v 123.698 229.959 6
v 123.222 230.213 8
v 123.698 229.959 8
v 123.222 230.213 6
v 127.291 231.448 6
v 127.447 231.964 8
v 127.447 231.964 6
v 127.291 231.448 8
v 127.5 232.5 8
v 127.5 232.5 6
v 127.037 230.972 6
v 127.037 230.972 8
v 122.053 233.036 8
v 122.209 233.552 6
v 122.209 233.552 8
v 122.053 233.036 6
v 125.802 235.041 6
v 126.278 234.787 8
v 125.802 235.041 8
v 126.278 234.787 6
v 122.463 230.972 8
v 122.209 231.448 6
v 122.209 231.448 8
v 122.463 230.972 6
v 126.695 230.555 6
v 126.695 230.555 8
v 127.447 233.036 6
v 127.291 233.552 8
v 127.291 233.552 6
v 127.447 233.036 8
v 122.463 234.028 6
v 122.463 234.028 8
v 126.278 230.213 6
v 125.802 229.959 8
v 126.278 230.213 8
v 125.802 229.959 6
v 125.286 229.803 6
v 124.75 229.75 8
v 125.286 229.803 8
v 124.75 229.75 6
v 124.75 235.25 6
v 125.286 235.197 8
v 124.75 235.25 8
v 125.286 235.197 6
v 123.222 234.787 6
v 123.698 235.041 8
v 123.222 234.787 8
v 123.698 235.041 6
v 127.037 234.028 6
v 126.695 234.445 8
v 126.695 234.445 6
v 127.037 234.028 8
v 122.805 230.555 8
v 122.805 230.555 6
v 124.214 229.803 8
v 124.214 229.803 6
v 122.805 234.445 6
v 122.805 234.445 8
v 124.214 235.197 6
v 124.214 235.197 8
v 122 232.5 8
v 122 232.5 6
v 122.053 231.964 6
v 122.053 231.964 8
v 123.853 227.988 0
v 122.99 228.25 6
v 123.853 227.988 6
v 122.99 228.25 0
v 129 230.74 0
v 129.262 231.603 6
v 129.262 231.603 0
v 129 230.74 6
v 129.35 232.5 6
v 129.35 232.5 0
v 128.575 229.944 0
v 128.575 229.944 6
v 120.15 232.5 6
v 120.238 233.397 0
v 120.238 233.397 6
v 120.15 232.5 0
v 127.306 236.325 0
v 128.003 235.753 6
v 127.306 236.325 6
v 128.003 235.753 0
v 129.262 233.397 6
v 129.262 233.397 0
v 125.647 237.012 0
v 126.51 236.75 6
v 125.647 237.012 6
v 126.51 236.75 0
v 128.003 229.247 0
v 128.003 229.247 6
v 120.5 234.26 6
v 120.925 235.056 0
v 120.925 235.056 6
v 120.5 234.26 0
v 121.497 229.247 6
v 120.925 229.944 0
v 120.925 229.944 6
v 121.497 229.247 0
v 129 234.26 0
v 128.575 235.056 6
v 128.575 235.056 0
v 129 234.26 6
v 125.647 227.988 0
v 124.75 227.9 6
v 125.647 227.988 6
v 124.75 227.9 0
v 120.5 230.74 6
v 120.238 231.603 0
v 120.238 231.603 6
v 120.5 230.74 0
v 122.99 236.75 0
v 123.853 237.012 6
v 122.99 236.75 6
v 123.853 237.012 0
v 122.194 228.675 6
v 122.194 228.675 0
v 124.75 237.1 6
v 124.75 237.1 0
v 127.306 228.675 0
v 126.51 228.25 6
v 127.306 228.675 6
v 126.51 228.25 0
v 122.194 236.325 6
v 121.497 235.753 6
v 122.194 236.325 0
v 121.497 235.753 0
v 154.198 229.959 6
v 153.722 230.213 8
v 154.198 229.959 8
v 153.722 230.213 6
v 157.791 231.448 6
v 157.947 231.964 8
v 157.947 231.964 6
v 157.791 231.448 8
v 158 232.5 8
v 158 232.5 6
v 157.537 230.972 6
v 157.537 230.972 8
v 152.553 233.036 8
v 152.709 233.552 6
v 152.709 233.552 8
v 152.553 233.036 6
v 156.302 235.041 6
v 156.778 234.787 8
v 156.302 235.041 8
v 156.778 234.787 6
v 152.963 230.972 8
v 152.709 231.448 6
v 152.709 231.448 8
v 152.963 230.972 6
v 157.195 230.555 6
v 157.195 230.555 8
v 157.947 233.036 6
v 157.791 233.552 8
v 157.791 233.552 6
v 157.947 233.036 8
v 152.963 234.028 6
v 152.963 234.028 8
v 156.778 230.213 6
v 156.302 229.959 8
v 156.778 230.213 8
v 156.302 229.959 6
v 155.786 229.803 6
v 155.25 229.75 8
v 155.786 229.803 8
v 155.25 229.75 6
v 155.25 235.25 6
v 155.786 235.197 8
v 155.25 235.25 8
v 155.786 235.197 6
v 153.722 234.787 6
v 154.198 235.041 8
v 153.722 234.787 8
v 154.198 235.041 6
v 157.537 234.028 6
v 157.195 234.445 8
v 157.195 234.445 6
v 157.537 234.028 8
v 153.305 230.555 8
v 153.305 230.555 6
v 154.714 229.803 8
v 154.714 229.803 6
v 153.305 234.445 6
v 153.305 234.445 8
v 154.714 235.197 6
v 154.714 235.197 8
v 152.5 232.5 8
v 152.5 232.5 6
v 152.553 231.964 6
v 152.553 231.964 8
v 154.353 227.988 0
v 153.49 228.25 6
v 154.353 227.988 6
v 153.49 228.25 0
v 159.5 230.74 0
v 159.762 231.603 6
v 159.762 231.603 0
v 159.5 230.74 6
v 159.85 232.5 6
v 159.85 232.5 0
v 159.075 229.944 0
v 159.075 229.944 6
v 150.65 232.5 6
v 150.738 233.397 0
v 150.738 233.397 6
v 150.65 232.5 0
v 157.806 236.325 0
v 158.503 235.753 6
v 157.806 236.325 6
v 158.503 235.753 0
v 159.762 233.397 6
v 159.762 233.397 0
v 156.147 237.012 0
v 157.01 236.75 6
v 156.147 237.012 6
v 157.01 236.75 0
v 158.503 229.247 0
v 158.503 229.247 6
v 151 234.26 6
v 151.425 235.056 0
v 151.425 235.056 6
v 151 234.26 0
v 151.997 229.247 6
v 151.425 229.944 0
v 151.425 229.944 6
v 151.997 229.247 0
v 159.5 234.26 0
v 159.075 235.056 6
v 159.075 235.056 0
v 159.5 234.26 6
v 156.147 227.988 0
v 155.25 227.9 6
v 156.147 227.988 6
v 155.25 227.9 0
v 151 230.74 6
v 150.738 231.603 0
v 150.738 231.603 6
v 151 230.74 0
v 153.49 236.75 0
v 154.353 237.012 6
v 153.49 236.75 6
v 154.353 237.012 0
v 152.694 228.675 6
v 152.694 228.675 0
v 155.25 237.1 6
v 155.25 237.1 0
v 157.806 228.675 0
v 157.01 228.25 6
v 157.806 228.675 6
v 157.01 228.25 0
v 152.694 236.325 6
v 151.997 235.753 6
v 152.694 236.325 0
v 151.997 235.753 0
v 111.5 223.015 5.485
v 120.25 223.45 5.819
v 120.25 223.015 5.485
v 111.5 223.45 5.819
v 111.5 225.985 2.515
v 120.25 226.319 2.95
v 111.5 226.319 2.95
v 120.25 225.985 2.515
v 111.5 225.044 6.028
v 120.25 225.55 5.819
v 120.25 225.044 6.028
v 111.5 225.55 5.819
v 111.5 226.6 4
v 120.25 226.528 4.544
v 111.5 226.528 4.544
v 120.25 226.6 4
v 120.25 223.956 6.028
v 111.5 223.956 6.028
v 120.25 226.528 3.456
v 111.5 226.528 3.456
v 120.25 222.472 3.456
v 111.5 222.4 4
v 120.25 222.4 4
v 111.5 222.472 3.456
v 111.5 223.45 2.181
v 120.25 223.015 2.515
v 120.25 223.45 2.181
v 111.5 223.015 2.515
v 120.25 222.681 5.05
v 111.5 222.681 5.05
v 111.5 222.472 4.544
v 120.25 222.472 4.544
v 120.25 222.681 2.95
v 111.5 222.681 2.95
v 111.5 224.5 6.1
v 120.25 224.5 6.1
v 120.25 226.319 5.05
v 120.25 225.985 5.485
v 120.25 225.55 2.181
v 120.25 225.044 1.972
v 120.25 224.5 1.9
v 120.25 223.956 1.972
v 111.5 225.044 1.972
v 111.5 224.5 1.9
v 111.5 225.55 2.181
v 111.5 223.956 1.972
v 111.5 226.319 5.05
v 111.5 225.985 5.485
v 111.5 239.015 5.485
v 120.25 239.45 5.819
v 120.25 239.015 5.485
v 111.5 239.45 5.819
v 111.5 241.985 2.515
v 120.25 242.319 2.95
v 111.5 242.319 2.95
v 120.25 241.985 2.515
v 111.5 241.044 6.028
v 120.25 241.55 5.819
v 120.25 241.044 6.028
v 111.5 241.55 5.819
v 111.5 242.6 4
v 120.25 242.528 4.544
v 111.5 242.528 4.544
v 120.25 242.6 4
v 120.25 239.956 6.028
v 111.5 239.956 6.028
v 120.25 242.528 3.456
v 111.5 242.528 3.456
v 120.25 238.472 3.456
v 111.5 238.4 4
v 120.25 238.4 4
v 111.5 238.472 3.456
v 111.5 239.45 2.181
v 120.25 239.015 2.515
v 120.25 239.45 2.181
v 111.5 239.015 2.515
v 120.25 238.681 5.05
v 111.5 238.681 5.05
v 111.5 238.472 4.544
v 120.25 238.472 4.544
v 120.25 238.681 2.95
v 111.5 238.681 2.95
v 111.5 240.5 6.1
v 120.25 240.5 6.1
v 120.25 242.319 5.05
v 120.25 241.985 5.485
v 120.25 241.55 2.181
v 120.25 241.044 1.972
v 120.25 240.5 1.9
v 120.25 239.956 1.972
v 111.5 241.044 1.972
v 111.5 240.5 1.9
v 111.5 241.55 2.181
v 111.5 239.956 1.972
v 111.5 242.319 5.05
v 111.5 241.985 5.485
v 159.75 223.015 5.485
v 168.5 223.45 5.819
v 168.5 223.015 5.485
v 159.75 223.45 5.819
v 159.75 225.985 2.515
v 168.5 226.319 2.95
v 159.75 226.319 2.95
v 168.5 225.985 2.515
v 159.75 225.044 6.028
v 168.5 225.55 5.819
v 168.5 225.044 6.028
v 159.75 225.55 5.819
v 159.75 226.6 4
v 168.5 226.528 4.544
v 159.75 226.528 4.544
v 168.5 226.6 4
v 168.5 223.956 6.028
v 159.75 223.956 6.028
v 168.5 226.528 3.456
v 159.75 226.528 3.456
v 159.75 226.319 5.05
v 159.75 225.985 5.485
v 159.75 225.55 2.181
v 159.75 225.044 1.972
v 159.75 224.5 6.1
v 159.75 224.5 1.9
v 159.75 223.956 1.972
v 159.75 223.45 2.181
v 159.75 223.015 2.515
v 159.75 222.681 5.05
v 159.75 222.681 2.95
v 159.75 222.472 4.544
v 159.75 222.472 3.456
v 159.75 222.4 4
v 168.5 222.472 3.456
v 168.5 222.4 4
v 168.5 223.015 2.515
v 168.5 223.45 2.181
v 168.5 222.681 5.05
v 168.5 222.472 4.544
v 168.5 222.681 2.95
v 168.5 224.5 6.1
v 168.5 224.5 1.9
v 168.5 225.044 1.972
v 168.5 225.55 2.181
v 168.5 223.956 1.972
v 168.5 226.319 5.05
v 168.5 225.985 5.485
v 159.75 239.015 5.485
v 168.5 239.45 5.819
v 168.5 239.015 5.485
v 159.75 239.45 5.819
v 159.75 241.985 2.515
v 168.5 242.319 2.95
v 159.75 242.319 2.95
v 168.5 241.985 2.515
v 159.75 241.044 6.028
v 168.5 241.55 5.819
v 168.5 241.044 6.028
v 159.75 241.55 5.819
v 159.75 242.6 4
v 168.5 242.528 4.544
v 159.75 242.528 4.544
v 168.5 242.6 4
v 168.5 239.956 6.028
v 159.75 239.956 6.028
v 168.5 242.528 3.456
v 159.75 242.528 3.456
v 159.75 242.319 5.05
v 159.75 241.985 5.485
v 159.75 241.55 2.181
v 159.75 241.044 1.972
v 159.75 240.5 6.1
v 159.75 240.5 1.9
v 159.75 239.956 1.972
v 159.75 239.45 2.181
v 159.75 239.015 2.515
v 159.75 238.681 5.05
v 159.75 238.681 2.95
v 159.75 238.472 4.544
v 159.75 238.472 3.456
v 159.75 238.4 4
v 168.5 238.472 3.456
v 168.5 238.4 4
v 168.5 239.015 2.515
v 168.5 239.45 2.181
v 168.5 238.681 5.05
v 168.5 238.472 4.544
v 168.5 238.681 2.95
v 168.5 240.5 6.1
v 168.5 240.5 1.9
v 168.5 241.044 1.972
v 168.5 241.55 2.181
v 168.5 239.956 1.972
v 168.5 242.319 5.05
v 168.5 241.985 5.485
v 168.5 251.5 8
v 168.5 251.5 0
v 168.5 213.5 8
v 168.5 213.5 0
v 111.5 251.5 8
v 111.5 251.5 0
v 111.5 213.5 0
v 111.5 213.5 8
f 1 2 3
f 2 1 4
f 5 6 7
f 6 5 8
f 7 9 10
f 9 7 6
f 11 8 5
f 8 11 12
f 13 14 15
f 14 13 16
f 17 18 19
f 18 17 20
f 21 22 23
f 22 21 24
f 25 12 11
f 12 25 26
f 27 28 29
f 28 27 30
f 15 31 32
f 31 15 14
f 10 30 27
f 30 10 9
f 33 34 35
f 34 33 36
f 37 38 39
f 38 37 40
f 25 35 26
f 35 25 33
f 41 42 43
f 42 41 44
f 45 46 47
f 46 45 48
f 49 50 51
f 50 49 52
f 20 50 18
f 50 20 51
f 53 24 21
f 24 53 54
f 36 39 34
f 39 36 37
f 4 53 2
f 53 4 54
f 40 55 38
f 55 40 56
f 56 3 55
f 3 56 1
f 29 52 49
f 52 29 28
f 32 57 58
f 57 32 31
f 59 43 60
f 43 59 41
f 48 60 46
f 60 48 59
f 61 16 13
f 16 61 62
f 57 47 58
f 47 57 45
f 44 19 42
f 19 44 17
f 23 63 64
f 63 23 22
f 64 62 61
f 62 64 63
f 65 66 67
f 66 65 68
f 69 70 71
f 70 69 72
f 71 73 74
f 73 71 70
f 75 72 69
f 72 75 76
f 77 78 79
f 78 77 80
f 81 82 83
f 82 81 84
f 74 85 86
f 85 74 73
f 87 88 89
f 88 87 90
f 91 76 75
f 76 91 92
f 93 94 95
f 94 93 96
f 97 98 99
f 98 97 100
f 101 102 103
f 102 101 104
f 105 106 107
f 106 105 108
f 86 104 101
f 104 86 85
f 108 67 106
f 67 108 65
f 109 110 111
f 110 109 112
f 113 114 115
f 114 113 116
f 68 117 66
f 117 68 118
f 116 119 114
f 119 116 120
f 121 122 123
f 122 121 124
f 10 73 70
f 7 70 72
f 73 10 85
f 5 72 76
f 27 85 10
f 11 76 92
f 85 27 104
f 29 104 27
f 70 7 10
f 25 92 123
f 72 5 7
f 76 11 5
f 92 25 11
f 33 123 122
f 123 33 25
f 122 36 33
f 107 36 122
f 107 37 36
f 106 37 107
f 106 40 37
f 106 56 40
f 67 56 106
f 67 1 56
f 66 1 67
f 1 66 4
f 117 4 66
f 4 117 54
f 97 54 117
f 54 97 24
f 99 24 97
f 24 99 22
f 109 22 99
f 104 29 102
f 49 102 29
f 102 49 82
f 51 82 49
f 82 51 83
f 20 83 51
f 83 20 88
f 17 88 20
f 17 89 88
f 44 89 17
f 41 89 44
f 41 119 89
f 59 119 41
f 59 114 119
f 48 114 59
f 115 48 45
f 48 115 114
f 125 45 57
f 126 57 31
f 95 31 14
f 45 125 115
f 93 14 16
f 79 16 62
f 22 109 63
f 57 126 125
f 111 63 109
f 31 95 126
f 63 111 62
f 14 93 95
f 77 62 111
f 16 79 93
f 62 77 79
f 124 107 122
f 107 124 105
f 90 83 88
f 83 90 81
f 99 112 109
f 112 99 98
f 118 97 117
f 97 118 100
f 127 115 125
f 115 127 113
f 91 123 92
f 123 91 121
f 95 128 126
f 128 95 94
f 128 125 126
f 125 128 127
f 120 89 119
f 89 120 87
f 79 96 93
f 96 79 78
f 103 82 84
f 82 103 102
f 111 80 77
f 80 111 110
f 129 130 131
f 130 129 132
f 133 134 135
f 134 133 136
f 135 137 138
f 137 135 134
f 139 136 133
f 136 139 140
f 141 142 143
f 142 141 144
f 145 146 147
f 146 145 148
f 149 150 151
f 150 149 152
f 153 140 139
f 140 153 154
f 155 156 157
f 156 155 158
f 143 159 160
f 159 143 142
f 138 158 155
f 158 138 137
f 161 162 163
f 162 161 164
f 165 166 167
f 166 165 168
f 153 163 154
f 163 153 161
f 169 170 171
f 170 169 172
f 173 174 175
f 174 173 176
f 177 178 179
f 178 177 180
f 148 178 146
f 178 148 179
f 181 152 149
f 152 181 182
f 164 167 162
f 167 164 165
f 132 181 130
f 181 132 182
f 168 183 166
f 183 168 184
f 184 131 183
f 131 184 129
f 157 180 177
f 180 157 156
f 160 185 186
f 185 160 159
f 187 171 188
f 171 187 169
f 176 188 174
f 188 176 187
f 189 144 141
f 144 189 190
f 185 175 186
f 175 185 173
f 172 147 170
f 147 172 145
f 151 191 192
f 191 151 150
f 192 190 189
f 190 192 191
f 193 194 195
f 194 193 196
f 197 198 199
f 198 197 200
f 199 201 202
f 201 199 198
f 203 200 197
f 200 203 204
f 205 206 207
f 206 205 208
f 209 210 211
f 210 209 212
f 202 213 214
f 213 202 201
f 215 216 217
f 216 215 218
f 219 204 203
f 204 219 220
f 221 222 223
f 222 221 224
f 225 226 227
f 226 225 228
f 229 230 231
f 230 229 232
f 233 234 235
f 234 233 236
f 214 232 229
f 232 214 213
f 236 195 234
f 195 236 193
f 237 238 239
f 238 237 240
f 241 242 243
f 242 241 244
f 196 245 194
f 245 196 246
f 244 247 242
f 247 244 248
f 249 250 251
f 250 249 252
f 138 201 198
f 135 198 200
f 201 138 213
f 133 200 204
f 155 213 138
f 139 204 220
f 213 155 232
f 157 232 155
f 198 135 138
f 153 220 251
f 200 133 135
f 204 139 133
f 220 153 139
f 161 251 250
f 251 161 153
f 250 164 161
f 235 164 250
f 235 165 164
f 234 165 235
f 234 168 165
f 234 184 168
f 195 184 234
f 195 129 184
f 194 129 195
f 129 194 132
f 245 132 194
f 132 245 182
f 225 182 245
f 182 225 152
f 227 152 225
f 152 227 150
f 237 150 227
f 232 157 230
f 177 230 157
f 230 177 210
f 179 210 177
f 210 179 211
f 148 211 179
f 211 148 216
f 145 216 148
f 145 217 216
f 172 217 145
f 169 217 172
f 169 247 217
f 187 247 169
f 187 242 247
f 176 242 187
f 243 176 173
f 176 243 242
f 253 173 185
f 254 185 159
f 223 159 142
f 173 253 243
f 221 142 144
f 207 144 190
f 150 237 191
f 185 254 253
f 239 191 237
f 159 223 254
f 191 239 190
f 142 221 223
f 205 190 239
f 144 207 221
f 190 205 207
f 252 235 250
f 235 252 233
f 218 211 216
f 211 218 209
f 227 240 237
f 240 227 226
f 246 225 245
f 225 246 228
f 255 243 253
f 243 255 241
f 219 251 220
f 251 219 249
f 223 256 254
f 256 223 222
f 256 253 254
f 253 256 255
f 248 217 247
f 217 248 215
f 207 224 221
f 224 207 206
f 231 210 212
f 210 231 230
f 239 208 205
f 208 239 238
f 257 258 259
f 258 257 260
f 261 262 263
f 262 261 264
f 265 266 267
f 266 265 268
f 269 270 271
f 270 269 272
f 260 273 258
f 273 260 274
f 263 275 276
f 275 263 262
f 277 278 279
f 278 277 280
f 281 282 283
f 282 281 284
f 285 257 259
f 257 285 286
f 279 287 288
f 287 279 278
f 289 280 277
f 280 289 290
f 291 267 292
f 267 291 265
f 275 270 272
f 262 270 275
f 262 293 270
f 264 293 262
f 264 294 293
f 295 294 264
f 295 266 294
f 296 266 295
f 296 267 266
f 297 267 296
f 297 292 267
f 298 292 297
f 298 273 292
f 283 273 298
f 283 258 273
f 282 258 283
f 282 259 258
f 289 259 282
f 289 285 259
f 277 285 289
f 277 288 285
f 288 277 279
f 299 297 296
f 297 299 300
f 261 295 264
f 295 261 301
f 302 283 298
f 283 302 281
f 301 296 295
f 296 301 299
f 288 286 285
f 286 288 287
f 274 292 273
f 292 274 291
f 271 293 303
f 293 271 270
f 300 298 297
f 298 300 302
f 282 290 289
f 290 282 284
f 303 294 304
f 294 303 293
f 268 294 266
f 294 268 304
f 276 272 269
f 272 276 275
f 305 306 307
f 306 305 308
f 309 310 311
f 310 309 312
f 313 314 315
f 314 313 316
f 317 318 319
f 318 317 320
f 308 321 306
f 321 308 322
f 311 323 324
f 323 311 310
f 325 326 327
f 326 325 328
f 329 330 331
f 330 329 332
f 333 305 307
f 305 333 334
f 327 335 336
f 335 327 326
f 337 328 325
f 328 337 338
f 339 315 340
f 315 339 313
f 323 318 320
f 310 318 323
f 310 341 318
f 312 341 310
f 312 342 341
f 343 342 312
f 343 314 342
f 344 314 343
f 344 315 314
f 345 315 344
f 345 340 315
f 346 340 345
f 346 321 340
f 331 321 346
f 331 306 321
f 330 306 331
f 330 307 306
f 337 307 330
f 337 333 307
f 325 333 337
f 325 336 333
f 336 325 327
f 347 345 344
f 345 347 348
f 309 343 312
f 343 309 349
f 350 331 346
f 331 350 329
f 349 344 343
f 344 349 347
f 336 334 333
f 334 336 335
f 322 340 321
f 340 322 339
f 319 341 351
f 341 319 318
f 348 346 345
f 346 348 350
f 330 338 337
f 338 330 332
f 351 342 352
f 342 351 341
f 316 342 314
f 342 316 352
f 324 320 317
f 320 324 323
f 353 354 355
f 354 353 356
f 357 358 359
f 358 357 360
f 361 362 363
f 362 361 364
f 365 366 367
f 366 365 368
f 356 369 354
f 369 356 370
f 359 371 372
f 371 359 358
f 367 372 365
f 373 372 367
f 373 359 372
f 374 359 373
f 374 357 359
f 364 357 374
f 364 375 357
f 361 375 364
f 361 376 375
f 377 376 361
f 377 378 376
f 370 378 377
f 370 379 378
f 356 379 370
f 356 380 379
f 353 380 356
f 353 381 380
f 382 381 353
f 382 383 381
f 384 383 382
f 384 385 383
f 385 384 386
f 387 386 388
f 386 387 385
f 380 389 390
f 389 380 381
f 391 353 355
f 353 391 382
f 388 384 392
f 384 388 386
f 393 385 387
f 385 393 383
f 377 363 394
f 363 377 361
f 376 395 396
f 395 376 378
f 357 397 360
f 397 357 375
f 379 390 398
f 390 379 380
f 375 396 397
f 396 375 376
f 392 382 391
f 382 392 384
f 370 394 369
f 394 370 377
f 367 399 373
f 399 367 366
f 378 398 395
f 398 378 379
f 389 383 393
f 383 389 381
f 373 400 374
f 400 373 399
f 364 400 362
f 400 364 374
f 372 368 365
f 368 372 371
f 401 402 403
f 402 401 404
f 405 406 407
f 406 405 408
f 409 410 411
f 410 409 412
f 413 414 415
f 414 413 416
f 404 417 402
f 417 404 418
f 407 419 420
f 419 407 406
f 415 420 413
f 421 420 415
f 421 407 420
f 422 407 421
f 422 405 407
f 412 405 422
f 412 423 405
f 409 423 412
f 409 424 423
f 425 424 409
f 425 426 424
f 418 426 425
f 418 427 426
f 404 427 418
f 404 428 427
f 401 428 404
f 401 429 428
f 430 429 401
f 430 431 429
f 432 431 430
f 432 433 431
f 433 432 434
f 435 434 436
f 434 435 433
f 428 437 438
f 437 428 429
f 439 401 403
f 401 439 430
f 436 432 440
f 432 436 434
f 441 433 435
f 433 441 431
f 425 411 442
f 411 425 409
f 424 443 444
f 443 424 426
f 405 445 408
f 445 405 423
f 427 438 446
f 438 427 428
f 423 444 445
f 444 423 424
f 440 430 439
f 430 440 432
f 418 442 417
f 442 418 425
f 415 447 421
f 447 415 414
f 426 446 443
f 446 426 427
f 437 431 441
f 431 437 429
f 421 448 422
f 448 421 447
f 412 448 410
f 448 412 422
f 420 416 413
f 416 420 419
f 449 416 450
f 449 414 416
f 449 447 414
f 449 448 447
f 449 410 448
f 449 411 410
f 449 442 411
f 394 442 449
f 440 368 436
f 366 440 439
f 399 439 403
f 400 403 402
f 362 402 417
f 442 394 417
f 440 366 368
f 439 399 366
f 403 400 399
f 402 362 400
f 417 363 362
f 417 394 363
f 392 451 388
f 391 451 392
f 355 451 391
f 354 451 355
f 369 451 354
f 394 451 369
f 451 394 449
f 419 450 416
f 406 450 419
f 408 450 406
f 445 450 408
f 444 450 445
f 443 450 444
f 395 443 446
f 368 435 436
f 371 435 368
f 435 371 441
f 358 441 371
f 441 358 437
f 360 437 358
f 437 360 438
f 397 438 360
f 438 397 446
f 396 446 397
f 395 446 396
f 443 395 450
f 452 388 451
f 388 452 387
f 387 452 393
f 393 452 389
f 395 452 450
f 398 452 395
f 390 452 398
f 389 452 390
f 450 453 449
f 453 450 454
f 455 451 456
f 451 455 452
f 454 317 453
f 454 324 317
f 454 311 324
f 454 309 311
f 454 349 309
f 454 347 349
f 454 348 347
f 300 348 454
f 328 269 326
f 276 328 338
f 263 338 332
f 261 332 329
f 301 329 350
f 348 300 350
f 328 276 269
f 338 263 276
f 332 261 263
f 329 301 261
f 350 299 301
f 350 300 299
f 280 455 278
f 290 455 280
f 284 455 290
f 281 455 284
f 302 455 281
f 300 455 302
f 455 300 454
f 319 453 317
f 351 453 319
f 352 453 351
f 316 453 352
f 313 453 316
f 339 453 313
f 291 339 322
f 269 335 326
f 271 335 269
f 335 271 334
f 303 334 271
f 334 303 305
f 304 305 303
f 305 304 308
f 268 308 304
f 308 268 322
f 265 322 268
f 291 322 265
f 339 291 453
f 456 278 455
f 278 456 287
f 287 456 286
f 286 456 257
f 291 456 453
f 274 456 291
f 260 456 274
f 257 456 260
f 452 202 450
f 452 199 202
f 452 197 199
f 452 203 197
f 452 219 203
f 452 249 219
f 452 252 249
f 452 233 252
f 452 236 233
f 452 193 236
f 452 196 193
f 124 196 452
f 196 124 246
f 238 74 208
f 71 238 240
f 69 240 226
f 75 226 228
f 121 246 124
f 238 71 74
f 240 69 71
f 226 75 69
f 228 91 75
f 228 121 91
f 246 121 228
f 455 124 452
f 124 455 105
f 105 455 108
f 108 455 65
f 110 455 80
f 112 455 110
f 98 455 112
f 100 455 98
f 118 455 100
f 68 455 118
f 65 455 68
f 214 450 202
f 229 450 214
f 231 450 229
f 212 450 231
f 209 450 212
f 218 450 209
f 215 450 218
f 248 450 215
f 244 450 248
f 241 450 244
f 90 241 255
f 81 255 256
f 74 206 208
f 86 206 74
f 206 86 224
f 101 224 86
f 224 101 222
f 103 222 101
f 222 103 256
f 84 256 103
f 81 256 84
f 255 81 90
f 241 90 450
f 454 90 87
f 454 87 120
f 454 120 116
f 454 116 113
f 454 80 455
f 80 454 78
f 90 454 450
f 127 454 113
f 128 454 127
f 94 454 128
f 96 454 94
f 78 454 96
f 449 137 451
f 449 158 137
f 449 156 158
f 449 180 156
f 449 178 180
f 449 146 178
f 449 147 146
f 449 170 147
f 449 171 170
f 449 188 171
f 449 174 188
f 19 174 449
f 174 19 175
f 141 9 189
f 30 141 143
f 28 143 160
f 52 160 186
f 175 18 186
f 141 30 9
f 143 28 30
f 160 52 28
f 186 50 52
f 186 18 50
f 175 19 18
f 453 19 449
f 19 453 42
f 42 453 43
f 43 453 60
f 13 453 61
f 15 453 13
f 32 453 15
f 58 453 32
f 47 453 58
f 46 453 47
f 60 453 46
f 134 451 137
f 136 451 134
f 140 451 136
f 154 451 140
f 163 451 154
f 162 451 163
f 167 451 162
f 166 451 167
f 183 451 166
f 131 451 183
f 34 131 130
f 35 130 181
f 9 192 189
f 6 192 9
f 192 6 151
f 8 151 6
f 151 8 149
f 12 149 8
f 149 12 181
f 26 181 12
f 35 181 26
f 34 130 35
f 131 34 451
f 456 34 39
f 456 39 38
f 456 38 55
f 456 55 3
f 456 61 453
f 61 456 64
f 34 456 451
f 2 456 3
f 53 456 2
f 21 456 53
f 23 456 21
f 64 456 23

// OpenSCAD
include <../lib/meshtastic-drybag-node-lib.scad>;
$fn = 40;
spacer_print(true);
